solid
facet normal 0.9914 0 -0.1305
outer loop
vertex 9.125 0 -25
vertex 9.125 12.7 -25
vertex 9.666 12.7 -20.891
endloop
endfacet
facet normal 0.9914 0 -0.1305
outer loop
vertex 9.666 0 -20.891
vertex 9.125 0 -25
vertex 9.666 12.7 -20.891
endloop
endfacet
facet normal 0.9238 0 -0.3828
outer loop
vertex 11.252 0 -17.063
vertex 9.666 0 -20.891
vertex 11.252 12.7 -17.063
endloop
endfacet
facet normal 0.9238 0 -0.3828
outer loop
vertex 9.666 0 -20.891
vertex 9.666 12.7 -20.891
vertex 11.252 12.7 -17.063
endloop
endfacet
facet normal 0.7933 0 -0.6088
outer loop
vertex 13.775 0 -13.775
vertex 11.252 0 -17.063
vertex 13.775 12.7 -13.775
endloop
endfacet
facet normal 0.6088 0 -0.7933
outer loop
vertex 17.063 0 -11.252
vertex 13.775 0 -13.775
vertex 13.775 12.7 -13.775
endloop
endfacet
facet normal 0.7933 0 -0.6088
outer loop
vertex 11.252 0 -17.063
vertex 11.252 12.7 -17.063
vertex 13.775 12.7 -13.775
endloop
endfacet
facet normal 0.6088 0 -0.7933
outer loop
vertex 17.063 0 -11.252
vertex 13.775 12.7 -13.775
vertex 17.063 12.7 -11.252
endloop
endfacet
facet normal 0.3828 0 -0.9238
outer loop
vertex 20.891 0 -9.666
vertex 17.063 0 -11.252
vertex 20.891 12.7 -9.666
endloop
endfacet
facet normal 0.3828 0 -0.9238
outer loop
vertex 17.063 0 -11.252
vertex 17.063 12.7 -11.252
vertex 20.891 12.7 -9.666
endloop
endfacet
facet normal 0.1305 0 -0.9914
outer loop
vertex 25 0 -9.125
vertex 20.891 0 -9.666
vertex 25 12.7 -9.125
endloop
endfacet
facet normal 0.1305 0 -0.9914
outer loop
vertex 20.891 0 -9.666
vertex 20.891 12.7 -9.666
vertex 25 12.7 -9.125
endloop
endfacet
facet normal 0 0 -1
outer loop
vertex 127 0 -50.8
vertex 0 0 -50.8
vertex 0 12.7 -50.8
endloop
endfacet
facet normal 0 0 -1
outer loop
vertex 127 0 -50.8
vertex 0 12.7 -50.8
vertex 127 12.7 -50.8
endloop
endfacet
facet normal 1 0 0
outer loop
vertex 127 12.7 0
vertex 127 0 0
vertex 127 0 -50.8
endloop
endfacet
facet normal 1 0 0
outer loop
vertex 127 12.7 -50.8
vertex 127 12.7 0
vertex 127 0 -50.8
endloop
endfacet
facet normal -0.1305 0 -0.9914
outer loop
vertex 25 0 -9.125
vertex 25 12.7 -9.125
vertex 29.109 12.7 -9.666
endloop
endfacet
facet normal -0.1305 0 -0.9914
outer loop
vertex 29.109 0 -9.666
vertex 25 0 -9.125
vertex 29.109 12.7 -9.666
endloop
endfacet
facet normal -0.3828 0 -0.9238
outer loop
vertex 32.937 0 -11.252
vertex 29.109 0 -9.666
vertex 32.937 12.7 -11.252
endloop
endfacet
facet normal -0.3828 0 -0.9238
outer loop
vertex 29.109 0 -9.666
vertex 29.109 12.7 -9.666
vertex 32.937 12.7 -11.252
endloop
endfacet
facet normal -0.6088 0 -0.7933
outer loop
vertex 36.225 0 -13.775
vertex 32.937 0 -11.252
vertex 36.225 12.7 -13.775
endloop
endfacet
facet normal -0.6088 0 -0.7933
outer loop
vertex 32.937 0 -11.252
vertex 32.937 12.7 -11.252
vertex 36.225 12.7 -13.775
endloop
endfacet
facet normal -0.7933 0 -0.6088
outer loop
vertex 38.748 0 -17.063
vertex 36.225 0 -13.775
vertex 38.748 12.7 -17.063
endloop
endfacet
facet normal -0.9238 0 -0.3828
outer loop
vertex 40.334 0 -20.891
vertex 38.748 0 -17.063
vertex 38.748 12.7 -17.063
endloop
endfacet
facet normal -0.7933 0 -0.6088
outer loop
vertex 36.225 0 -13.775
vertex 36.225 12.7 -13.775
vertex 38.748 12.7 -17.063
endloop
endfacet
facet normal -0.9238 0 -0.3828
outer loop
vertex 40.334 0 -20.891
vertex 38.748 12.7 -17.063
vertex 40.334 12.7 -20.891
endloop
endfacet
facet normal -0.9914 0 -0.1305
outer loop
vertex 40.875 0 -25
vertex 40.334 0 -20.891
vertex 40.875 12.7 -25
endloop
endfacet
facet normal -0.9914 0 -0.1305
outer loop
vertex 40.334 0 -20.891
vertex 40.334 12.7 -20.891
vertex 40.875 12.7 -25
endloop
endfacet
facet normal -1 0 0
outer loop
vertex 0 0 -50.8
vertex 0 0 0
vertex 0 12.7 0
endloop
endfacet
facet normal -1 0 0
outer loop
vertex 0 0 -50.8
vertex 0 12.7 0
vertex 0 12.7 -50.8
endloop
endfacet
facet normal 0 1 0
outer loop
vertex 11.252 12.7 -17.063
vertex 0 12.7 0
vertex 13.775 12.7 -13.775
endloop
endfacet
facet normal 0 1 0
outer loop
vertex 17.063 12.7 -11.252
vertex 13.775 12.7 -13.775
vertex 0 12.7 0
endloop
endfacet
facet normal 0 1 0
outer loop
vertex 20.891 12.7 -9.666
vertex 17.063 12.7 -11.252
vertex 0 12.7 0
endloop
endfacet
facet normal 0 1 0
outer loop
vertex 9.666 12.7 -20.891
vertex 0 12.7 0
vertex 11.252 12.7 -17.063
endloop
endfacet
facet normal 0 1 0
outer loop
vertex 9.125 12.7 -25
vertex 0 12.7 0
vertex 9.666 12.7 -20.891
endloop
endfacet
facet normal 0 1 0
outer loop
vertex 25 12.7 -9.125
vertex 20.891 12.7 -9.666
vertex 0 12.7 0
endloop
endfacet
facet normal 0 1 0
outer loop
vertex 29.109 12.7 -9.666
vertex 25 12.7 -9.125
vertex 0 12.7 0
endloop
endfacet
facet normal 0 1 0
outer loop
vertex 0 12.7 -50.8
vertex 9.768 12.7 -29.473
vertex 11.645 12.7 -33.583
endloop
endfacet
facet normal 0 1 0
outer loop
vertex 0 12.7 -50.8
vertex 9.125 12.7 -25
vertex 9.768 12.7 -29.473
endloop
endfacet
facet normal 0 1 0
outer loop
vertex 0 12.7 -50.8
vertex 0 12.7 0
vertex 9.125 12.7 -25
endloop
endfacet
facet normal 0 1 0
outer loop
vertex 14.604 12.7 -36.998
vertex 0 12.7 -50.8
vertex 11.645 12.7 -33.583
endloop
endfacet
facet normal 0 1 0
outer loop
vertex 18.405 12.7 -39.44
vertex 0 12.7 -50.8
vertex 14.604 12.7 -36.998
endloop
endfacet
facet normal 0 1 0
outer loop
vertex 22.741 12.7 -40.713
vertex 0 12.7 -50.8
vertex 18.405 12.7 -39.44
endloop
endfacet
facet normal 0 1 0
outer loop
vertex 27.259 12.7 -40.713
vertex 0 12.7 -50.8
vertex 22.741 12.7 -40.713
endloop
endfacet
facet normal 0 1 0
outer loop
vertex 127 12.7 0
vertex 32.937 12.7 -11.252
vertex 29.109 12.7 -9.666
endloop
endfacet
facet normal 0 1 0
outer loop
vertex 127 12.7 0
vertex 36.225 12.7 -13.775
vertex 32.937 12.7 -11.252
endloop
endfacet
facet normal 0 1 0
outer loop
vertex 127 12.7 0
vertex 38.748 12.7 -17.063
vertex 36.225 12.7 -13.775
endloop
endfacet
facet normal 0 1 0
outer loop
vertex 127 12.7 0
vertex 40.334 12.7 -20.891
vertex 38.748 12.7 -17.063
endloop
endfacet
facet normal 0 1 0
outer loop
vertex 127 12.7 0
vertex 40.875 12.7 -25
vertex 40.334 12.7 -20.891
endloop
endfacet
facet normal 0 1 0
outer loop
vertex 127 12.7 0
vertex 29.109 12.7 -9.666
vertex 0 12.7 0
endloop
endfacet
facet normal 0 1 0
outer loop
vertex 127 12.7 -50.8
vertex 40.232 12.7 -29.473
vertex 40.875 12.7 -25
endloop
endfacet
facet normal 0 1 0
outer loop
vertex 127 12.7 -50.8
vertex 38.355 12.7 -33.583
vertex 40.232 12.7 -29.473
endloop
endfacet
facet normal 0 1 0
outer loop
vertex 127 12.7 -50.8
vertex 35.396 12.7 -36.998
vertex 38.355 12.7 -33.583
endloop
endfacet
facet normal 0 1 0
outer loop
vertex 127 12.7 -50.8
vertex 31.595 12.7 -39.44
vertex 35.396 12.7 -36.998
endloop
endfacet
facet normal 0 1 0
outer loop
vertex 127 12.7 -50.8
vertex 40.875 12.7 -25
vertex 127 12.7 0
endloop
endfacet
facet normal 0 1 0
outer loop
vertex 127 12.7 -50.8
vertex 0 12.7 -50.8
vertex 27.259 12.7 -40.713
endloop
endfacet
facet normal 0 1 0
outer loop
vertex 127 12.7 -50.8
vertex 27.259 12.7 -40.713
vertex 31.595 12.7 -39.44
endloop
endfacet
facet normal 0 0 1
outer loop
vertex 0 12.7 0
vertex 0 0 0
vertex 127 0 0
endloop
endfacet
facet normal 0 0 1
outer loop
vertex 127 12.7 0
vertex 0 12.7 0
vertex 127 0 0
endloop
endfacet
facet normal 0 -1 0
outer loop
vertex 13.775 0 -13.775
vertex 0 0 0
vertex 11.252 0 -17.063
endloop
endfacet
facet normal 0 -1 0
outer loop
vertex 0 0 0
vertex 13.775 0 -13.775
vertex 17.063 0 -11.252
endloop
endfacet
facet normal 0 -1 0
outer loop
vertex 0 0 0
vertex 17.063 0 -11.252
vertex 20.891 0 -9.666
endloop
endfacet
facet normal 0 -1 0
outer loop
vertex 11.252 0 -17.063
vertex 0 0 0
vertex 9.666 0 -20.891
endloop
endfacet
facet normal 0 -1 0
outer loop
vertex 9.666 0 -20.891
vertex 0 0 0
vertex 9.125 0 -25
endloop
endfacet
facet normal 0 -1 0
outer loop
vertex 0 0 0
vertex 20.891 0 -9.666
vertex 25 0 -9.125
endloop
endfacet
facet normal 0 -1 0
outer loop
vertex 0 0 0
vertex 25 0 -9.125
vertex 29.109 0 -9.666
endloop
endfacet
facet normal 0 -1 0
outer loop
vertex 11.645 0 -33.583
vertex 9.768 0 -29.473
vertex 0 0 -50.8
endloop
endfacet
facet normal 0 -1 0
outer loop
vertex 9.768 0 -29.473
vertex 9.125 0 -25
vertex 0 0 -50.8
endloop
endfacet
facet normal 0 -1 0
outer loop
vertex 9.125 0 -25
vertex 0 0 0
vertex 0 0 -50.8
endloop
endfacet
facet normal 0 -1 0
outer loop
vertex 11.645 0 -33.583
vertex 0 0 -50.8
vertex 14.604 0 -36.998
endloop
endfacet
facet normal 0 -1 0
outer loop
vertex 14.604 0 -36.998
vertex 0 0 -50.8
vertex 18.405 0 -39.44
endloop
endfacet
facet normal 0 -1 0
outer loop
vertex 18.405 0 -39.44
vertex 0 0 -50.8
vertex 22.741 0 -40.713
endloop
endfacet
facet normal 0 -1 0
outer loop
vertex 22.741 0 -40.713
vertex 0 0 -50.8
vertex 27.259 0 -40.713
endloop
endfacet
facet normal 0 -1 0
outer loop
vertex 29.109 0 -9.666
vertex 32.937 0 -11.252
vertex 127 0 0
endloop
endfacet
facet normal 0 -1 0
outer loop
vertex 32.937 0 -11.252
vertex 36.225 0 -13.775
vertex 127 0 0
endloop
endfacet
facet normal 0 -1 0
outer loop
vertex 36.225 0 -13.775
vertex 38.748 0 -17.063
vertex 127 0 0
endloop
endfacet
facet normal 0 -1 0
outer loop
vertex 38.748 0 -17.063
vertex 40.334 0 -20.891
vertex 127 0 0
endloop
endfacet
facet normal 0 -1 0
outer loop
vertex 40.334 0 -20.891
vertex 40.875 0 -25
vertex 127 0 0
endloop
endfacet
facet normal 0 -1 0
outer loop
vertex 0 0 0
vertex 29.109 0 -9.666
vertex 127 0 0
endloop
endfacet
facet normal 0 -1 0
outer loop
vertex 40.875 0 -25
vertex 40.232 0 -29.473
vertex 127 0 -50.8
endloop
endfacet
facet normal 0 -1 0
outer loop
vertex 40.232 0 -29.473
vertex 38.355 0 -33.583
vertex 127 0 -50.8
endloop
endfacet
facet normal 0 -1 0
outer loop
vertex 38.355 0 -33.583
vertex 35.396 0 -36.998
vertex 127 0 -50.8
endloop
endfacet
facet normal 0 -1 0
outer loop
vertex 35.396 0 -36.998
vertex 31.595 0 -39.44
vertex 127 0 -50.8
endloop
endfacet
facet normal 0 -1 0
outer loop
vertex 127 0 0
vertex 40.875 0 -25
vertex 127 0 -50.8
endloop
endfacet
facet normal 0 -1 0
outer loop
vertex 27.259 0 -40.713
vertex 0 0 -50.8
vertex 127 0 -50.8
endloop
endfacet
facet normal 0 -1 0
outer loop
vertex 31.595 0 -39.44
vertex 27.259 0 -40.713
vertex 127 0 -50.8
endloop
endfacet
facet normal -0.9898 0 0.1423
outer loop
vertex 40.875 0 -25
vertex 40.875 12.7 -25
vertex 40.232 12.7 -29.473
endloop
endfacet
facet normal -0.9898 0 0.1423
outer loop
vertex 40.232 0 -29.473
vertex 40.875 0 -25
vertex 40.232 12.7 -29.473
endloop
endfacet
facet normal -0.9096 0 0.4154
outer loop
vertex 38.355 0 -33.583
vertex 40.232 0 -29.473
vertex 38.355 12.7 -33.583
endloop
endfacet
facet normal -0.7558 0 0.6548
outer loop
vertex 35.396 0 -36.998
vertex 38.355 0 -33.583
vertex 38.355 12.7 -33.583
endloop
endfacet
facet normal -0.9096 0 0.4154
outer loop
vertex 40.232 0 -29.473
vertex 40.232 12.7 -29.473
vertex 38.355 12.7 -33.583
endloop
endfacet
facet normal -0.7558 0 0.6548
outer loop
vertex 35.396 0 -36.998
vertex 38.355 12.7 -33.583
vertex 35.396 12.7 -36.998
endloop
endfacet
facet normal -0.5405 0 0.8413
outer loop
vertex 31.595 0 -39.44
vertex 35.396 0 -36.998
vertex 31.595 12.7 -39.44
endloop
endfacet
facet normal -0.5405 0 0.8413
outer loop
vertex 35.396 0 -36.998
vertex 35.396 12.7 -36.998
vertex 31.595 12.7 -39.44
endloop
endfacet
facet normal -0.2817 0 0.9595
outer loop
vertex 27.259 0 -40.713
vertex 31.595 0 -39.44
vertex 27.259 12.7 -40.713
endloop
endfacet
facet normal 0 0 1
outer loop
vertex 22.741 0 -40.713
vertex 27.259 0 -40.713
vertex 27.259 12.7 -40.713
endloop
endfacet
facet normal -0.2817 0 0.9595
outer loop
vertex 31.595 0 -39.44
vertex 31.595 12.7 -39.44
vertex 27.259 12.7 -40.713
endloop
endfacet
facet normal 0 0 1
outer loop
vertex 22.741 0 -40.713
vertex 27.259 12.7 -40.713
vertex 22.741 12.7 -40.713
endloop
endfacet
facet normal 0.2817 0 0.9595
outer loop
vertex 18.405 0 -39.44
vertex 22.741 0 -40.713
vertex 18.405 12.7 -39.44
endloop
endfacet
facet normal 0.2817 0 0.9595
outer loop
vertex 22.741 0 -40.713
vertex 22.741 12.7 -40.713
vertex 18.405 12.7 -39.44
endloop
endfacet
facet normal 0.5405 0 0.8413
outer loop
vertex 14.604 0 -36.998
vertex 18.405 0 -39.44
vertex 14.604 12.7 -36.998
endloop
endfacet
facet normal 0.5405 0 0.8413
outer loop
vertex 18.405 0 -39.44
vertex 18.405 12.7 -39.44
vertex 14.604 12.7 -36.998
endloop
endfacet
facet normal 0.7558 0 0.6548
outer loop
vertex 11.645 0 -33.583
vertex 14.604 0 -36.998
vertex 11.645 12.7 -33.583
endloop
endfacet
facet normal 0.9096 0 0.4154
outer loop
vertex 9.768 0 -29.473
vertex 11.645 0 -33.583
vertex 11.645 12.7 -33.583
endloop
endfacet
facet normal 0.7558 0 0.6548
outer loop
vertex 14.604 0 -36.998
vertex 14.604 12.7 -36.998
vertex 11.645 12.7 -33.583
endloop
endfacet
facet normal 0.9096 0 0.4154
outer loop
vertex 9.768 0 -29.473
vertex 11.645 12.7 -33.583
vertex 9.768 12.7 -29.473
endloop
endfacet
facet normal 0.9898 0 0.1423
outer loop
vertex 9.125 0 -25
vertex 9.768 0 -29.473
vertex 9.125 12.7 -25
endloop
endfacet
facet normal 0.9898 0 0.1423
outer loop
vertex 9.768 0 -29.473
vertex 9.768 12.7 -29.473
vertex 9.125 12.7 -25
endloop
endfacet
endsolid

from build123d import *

# Parameters (mm, degrees)
SKETCH1_W           = 127
SKETCH1_H           = 50.8
BOSS_EXTRUDE1_DEPTH = 12.7
CUT_EXTRUDE1_DEPTH  = 12.7


with BuildPart() as part:
    # Sketch1 → Boss-Extrude1 (new body)
    with BuildSketch(Plane(origin=(0, 0, 0), x_dir=(1, 0, 0), z_dir=(0, 1, 0))):
        with Locations((63.5, 25.4)):
            Rectangle(SKETCH1_W, SKETCH1_H)
    extrude(amount=BOSS_EXTRUDE1_DEPTH)

    # Sketch2 → Cut-Extrude1 (cut)
    with BuildSketch(Plane(origin=(0, 12.7, 0), x_dir=(1, 0, 0), z_dir=(0, 1, 0))):
        with BuildLine():
            ThreePointArc((9.125, 25), (13.774679849, 13.774679849), (25, 9.125))
            Line((25, 9.125), (25, 25))
            Line((25, 25), (9.125, 25))
        make_face()
        with BuildLine():
            Line((25, 25), (25, 9.125))
            ThreePointArc((25, 9.125), (36.225320151, 13.774679849), (40.875, 25))
            ThreePointArc((40.875, 25), (25, 40.875), (9.125, 25))
            Line((9.125, 25), (25, 25))
        make_face()
    extrude(amount=-CUT_EXTRUDE1_DEPTH, mode=Mode.SUBTRACT)


solid = part.part
